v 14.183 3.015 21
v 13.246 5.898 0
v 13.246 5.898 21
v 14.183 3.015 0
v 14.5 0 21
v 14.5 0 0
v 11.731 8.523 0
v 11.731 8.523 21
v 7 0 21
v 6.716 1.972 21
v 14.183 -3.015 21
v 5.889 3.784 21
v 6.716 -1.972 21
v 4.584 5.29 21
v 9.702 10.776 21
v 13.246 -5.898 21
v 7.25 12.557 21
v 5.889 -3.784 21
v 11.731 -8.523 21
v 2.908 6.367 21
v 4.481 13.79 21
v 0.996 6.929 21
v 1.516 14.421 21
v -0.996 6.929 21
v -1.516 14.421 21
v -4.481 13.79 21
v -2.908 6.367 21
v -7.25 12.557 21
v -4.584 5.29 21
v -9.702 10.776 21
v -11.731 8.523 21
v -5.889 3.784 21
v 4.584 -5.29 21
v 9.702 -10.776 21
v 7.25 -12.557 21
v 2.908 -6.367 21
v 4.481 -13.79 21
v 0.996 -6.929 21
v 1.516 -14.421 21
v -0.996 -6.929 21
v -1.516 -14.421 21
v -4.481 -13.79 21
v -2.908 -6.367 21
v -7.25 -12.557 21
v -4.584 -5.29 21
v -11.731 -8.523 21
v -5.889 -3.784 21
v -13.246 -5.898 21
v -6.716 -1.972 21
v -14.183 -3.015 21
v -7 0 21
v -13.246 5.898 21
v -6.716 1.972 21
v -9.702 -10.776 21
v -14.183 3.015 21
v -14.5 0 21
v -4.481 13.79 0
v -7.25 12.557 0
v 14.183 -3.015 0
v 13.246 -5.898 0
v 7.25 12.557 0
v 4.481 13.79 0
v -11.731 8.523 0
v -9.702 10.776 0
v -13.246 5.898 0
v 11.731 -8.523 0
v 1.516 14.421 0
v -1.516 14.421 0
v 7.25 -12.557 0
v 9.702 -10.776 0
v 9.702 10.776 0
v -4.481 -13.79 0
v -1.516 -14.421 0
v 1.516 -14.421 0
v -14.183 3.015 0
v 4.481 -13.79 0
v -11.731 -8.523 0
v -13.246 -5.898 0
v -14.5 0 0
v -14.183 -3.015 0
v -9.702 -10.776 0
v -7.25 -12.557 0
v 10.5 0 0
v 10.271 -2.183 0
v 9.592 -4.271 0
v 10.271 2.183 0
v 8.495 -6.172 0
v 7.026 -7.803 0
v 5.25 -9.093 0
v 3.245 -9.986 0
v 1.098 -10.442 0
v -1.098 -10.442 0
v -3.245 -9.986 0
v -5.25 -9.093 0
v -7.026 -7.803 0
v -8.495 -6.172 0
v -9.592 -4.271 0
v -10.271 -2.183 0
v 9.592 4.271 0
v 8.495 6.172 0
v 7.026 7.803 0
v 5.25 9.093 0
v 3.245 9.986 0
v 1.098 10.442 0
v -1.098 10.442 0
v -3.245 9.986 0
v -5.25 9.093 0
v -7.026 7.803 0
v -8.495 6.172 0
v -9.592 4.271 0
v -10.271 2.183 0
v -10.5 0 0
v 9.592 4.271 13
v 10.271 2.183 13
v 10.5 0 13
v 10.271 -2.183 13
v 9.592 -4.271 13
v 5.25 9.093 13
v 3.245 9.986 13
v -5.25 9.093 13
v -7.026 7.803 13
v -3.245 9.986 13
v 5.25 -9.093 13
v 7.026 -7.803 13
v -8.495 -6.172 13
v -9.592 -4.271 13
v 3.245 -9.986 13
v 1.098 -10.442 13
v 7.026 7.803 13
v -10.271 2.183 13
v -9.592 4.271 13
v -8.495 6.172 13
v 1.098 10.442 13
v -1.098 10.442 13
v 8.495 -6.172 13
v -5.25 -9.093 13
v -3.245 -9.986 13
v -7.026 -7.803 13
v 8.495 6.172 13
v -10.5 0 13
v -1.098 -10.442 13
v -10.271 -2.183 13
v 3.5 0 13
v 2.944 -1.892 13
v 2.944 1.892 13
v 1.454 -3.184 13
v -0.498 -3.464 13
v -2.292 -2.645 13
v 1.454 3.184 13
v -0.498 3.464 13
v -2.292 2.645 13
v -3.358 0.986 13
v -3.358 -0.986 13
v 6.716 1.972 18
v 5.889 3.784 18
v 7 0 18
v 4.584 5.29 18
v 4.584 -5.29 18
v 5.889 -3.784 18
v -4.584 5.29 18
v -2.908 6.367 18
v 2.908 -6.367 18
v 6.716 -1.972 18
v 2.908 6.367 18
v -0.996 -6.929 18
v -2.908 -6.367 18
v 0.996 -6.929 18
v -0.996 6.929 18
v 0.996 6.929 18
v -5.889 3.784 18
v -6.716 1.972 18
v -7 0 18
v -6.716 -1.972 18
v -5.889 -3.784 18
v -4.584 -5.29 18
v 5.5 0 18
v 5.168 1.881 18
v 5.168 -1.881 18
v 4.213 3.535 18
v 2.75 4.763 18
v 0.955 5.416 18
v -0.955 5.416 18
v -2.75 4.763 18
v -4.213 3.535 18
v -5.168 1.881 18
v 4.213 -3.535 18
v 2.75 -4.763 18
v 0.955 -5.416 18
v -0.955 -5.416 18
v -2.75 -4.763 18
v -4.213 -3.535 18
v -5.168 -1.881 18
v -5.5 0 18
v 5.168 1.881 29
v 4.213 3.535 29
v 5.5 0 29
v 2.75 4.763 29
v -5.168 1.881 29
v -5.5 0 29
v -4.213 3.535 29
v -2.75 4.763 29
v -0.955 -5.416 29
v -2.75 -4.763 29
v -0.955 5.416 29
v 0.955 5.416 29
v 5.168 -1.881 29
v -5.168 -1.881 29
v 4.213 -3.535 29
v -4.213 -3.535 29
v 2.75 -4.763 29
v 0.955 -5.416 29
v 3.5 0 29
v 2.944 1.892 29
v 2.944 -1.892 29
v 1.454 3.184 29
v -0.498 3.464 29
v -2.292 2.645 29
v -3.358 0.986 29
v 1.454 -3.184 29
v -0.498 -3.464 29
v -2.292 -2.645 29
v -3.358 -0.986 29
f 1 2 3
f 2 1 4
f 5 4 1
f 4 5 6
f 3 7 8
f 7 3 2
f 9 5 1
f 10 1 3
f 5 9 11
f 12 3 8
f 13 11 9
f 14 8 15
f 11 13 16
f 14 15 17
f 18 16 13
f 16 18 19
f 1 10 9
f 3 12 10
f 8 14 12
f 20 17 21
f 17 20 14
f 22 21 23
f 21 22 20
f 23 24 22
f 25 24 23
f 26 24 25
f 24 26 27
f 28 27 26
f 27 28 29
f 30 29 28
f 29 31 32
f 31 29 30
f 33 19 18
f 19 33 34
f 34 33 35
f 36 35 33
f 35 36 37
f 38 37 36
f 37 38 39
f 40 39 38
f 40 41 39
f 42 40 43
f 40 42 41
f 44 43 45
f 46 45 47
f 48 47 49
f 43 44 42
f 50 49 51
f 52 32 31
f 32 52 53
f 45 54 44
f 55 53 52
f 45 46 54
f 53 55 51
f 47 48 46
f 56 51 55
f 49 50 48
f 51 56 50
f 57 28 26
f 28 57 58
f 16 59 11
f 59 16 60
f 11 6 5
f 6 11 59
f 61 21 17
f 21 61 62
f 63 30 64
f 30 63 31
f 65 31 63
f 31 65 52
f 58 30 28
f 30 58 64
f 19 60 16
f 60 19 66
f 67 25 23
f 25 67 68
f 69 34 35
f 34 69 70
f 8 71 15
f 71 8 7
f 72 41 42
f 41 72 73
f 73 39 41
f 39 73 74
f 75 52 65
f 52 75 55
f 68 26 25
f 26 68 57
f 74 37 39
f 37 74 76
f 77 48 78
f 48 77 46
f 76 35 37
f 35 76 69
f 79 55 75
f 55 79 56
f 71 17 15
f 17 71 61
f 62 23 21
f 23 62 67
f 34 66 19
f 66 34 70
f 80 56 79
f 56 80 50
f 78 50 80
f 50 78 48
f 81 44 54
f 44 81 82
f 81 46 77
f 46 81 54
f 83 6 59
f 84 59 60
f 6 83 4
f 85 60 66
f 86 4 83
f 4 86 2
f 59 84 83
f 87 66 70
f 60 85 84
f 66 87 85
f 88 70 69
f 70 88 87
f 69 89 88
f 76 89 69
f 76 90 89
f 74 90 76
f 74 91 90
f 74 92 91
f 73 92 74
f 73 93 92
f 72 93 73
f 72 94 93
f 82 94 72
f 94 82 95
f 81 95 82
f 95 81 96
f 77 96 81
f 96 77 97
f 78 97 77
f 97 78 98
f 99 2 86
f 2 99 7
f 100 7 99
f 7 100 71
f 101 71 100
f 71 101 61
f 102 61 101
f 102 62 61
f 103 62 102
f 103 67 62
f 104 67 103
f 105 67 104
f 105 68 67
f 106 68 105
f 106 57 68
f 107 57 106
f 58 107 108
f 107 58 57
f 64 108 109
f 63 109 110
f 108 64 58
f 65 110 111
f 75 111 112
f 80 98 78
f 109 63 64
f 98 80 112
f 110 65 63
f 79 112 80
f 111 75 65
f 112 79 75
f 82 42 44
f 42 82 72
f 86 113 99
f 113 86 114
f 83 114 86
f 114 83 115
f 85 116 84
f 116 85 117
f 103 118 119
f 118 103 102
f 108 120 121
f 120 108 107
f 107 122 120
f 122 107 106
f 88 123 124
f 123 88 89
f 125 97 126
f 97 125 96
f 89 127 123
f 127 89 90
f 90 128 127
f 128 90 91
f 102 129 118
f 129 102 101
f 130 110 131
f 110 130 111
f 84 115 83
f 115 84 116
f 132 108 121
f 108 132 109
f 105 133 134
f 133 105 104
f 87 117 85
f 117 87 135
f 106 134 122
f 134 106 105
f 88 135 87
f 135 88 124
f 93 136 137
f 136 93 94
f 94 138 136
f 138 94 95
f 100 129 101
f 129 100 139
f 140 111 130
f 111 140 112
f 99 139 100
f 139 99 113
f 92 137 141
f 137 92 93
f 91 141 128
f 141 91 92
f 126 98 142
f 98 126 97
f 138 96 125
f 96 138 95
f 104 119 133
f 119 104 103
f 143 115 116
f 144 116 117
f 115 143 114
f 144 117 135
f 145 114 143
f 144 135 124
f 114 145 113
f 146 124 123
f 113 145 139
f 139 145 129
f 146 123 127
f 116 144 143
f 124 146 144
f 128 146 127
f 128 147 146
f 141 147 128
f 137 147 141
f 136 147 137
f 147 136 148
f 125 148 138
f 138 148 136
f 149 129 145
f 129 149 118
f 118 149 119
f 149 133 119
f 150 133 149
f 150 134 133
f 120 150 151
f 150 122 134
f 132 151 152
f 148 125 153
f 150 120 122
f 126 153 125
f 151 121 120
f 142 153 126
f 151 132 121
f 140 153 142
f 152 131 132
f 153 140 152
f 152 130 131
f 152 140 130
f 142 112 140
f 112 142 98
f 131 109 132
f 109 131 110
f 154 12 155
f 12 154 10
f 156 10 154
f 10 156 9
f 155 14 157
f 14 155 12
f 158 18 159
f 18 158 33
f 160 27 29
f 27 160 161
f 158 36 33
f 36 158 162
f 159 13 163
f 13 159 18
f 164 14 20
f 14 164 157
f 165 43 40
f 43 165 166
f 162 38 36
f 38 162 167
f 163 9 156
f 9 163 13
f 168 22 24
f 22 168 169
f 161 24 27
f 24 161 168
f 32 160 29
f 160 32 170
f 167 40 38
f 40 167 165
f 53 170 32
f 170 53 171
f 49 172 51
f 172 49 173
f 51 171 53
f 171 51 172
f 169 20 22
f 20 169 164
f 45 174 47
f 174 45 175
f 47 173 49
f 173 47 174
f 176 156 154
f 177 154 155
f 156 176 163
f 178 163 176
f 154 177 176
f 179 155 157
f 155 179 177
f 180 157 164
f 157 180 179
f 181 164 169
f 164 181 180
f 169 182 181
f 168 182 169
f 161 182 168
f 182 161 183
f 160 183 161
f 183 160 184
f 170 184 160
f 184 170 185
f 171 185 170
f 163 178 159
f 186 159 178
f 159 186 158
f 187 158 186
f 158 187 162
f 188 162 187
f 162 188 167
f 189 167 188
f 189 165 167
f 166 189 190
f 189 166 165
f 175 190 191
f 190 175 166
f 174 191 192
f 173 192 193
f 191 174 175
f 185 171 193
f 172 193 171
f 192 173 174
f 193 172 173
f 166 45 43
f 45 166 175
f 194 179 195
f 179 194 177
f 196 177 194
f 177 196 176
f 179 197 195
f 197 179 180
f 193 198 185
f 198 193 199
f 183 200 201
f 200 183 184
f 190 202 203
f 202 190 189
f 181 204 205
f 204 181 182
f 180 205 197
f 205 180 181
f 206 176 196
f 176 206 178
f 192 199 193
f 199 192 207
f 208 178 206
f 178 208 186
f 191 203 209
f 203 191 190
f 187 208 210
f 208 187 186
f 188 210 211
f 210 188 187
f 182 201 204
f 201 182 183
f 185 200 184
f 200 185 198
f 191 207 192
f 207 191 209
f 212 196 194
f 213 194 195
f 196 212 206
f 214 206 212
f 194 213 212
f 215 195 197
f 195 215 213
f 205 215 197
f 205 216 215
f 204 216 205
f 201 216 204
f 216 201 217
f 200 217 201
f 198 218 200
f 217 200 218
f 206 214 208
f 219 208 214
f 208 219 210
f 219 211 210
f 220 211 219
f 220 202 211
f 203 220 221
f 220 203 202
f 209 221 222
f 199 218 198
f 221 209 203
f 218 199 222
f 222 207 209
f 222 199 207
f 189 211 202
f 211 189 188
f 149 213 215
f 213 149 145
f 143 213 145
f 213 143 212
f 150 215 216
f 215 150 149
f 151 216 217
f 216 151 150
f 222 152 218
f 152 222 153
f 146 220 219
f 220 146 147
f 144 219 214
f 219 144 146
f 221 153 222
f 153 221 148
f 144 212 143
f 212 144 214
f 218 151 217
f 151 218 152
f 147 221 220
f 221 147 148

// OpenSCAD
VALVE_DIAM = 21;
VALVE_DEPTH = 13;
WALL_THICKNESS = 4;
MIDSECTION = 5;
ORING_HEIGHT = 3;
OUTPUT_DIAM = 11;
OUTPUT_DEPTH = 7;

difference() {
  union() {
    difference() {
      cylinder(d=VALVE_DIAM+2*WALL_THICKNESS, h=VALVE_DEPTH+MIDSECTION+ORING_HEIGHT);
      translate([0,0,-0.1]) cylinder(d=VALVE_DIAM, h=VALVE_DEPTH+0.1);
      translate([0,0,VALVE_DEPTH+MIDSECTION]) cylinder(d=OUTPUT_DIAM+ORING_HEIGHT, h=ORING_HEIGHT*2);
    }
    translate([0,0,VALVE_DEPTH+MIDSECTION]) cylinder(d=OUTPUT_DIAM, h=OUTPUT_DEPTH+ORING_HEIGHT+1);
 }
 translate([0,0,VALVE_DEPTH-0.1]) cylinder(d=OUTPUT_DIAM-WALL_THICKNESS, h=OUTPUT_DEPTH+ORING_HEIGHT+MIDSECTION+0.2);
 translate([0,0,VALVE_DEPTH-0.1]) cylinder(d=OUTPUT_DIAM-WALL_THICKNESS, h=OUTPUT_DEPTH+ORING_HEIGHT+MIDSECTION+2);
}
